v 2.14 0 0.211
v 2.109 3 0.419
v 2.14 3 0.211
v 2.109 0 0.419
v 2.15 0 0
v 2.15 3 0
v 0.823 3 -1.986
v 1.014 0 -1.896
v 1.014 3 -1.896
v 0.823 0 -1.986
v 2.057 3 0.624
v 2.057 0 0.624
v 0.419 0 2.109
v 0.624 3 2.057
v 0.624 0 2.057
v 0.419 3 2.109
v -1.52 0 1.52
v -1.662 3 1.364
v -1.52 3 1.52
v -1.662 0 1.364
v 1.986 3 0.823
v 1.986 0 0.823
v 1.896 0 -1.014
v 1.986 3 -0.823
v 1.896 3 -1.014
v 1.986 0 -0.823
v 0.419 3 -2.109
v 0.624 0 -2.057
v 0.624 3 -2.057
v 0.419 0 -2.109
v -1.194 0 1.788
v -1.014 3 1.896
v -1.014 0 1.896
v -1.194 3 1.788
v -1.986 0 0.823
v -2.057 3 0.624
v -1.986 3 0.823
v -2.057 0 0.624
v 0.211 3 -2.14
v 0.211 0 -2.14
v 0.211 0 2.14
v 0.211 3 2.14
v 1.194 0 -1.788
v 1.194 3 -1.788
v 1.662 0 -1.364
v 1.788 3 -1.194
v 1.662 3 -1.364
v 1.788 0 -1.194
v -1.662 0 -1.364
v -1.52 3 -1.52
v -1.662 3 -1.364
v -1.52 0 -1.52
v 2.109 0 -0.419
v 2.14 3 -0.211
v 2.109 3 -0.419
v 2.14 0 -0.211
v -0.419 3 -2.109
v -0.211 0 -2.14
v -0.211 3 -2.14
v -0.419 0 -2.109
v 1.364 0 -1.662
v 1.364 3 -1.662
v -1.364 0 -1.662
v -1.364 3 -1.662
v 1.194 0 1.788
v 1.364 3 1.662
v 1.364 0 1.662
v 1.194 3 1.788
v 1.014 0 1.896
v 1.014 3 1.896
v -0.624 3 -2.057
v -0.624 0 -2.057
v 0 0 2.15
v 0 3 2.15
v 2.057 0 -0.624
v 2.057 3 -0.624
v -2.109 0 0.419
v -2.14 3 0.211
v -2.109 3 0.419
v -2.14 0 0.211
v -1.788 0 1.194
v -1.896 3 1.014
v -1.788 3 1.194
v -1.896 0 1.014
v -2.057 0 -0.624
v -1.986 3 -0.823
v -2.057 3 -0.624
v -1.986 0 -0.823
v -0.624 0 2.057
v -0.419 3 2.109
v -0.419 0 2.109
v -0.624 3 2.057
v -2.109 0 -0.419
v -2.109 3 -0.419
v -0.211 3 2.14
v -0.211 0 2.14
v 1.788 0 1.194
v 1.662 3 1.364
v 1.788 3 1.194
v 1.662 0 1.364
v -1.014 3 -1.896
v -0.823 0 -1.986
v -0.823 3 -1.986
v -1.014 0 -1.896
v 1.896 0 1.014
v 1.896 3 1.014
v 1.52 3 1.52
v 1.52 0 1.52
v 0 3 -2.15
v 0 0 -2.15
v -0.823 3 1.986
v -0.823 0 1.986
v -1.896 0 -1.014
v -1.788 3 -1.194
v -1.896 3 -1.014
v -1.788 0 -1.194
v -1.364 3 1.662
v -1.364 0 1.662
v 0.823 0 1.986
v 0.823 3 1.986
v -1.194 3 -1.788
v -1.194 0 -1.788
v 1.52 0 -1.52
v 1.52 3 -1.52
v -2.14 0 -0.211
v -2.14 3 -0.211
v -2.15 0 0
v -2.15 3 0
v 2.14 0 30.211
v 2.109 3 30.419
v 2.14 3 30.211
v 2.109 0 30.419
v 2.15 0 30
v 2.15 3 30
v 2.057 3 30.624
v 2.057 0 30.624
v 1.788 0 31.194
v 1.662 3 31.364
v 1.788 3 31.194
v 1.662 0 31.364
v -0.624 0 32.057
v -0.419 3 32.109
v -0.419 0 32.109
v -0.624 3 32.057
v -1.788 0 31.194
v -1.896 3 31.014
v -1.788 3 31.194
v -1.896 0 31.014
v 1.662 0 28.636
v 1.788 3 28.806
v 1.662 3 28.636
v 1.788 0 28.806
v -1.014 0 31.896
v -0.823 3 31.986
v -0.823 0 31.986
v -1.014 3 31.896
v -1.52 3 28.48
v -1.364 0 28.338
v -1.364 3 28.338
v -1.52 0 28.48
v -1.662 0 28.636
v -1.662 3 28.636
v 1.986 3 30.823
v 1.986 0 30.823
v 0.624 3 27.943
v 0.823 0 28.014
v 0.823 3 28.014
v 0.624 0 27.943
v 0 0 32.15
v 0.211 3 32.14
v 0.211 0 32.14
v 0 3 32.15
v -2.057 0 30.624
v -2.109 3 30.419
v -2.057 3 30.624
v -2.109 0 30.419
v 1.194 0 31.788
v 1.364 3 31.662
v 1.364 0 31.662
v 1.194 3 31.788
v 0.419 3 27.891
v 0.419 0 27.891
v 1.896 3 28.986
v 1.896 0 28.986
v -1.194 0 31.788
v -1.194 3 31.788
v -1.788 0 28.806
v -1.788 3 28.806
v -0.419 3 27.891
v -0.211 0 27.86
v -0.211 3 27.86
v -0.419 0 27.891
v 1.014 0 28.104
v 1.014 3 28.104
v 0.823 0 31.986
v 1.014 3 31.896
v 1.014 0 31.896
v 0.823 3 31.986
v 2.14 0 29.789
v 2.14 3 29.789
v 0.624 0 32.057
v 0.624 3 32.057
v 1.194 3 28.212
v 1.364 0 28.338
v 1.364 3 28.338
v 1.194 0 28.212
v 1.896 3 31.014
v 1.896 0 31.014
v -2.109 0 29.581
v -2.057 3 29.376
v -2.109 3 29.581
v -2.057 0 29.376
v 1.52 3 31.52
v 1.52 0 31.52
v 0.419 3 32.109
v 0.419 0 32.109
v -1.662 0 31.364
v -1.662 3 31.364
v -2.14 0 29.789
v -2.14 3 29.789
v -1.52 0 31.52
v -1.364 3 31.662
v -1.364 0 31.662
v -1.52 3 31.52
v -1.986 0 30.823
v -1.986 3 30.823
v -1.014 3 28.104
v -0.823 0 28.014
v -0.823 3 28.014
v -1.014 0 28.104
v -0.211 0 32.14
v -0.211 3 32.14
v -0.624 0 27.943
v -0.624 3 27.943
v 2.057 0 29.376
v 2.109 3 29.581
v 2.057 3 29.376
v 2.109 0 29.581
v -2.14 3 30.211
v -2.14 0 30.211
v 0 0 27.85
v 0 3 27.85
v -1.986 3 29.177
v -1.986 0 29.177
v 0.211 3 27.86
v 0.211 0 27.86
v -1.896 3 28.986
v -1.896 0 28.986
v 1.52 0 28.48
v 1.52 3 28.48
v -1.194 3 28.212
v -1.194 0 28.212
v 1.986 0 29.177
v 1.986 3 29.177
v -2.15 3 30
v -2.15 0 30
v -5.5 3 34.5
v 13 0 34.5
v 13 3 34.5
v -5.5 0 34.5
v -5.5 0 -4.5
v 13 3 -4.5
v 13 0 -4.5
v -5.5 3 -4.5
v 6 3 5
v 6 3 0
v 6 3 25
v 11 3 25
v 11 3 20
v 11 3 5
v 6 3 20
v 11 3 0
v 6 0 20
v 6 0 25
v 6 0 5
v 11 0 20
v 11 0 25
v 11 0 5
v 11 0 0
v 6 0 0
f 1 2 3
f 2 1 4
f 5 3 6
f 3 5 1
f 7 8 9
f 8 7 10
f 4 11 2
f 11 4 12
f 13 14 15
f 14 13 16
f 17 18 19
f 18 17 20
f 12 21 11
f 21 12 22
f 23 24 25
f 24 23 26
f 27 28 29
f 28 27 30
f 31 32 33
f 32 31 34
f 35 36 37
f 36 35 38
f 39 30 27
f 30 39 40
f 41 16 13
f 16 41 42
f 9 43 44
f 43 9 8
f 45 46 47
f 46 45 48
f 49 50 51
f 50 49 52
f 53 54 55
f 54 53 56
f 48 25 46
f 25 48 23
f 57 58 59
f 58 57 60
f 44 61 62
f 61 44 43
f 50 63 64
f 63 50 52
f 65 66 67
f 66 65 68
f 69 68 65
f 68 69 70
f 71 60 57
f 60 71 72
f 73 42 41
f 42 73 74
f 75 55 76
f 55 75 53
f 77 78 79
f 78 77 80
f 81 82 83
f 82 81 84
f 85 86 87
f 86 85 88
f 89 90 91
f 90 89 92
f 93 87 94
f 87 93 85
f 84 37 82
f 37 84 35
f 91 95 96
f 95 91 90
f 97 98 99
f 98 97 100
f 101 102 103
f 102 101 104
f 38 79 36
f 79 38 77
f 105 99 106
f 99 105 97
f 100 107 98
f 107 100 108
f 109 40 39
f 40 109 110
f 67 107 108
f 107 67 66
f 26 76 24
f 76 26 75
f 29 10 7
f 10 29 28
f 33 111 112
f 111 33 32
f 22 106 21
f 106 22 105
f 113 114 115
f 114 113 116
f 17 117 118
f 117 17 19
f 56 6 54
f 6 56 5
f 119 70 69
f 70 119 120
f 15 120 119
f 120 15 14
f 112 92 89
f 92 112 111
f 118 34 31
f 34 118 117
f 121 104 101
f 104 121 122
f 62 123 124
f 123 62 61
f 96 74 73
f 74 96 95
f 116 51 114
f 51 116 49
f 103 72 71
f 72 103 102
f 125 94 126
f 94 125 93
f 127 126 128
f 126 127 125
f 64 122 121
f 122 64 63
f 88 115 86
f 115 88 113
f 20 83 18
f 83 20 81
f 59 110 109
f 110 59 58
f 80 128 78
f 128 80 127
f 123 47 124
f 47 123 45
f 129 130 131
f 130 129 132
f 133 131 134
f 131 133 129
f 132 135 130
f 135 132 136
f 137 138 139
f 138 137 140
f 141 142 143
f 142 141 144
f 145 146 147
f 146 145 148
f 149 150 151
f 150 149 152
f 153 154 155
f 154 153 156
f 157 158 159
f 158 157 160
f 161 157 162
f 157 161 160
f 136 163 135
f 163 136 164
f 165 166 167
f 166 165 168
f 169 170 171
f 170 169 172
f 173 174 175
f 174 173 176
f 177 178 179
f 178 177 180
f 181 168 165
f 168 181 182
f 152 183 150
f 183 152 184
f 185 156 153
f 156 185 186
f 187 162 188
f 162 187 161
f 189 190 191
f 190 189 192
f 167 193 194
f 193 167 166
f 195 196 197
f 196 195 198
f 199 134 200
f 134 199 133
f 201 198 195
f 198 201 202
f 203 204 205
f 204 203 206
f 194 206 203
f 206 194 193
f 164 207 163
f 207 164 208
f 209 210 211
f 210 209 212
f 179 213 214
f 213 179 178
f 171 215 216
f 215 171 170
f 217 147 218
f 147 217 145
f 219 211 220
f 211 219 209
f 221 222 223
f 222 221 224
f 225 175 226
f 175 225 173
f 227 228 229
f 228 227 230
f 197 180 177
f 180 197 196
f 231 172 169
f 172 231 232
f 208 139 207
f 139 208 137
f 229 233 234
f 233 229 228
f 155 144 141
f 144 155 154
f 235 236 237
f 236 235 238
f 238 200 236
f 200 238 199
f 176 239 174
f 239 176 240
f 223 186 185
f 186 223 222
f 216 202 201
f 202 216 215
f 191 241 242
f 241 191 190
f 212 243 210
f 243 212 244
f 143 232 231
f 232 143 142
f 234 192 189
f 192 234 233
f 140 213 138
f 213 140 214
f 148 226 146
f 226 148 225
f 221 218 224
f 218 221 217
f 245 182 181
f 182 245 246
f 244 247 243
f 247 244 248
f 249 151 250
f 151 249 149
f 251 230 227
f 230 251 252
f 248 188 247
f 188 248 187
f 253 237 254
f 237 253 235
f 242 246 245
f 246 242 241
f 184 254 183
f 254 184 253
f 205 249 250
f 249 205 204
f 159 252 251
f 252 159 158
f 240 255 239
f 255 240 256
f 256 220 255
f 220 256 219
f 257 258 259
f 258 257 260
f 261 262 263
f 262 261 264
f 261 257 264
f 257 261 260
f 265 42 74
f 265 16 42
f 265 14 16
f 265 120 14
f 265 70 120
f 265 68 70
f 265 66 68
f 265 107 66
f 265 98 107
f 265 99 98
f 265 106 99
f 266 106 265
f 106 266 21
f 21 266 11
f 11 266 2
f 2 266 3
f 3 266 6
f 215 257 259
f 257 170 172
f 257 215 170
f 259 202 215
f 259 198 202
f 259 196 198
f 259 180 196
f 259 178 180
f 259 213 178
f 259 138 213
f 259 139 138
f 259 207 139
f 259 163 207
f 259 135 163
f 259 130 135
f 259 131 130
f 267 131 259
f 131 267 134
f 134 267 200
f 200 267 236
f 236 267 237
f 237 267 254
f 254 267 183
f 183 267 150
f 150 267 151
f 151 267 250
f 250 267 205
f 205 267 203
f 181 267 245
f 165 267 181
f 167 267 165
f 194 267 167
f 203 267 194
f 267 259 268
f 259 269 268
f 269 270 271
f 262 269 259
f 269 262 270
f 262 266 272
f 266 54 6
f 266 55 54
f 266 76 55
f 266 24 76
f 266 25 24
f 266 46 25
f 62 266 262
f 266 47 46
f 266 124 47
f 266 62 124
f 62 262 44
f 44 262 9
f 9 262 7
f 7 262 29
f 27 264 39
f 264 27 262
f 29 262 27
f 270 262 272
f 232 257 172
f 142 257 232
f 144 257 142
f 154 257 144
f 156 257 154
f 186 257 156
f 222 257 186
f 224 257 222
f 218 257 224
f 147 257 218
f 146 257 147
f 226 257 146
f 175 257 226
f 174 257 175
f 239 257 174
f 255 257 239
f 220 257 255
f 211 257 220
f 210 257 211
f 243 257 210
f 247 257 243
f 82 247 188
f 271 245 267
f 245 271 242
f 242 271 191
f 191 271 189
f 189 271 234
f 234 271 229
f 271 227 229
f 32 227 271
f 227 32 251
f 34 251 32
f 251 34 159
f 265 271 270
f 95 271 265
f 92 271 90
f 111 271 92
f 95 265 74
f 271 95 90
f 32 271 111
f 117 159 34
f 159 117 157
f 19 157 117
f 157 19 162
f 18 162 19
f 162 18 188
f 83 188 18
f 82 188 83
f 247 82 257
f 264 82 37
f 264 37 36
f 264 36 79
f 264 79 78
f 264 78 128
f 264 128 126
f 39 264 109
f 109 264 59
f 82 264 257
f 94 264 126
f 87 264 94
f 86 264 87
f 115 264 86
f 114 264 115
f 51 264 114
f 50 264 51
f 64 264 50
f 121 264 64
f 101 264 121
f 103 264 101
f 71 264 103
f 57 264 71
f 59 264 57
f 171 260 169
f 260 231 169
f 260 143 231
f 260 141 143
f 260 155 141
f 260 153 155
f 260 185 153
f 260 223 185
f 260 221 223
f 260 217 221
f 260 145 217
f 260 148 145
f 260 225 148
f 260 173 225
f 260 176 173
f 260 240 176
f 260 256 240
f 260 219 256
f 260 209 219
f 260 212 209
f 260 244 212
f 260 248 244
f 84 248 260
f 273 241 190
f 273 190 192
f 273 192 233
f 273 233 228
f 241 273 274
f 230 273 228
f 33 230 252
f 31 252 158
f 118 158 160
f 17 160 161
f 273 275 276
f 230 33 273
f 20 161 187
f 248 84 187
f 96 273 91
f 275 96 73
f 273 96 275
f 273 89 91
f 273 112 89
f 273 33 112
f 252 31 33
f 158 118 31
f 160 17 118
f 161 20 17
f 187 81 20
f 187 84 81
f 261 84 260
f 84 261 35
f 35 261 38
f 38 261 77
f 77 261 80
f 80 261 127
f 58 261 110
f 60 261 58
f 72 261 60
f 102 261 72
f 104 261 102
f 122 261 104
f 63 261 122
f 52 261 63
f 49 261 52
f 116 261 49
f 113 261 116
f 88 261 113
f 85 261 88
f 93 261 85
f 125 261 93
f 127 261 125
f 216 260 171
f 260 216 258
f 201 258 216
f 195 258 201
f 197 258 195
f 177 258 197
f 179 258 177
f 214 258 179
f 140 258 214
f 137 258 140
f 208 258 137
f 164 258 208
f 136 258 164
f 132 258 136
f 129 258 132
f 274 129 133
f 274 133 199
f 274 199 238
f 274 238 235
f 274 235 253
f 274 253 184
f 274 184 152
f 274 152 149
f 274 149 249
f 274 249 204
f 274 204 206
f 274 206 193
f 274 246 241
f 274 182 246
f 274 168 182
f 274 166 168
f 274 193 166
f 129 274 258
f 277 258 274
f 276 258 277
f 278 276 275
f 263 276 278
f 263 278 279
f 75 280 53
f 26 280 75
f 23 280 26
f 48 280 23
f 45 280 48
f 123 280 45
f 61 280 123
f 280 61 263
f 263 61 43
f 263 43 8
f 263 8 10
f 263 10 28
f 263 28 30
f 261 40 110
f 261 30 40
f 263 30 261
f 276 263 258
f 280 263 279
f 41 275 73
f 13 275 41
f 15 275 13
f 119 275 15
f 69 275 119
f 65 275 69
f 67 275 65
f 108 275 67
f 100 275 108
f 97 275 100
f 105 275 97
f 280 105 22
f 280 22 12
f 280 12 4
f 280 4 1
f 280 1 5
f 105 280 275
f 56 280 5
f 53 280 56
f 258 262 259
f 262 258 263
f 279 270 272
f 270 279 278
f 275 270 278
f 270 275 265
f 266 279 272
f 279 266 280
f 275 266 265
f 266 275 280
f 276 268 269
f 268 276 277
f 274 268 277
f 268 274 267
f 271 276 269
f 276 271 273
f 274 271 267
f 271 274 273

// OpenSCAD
// file: rockpro.scad
include <../common.scad>

// All coordinates are in [x,y], or [x,y,z] format

pcbDimensions = [79.41, 127.06]; // [x,y]
pcbThickness = 1.22;

// TODO move mount points
mountPoints = [[0,0,0], [0,118,0], [71.0,118, 0], [71.0,0,0]];

module mountPoints_N(cylHeight, cylRad1, cylRad2, cylFn, center) {
  for (i=[0:3]) {
    p = mountPoints[i];
    translate(v=[p[0], p[1], p[2]])
    cylinder(r1=cylRad1, r2=cylRad2, h=cylHeight, $fn=cylFn, center=center);
  }
  
}

module pcb() {
  cube(size=[pcbDimensions[0], pcbDimensions[1], pcbThickness]);
}

// defined on x-z plane, start at top of pcb
module frontFaceIOCutouts_N() {
  translate(v=[9,0,0])
    cube(size=[26.0,inf50,7.5]);

  translate(v=[35,0,0])
    cube(size=[35,inf50,17.9]);
}
module backFaceIOCutouts_N() {
  translate(v=[9,0,0])
    cube(size=[61,inf50,14]);
}


module cutoutProfile_N() {

  color([1,0,1])
  union() {
  mirror(v=[0,1,0])
    translate(v=[0,-1,pcbThickness])
    frontFaceIOCutouts_N();

  translate(v=[0,pcbDimensions[1]-1, pcbThickness])
  backFaceIOCutouts_N();
  }

  color([0.3,0.8,0.1])
  difference() {
    pcb();
    translate(v=[3.75, 3.75])
      mountPoints_N(10,2,2,10,true);
  }
}

//cutoutProfile_N();


//mountPoints_N(10,2,2, true);
// file: ../rack/screws.scad
/* Some common screw dimensions */


inf = 400; // basically infinity

/********************************************************************************/
// M3 dimensions

m3HoleRadiusSlack = 0.15;
m3Diameter = 3.0;
m3Radius = m3Diameter/2.0;

m3RadiusSlacked = m3Radius + m3HoleRadiusSlack;

// legacy TODO: replace
m3ptr = m3RadiusSlacked;

// NUTS!
m3HexNutWidthAcrossFlats = 5.41;
m3HexNutWidthAcrossCorners = FtoG(m3HexNutWidthAcrossFlats);

m3HexNutThickness = 2.18;

module m3HexNutPocketNegative() {
  hexNutPocketNegative(m3RadiusSlacked,
                       m3HexNutWidthAcrossCorners/2 + 0.1,
                       m3HexNutThickness + 0.2);
}


// TODO: remove test

*difference() {
  cube(size=[8,12,5], center=true);

  rotate(a=[0,0,20])
  m3HexNutPocketNegative();
}

*m3HexNutPocketNegative();


/********************************************************************************/
// M4 dimensions

m4HoleRadiusSlack = 0.15;
m4Diameter = 4.0;
m4Radius = m4Diameter/2.0;
m4RadiusSlacked = m4Radius + m4HoleRadiusSlack;

m4HexNutWidthAcrossFlats = 6.89;
m4HexNutWidthAcrossCorners = FtoG(m4HexNutWidthAcrossFlats);

m4HexNutThickness = 3.07;

module m4HexNutPocketNegative() {
  hexNutPocketNegative(m4RadiusSlacked,
                       m4HexNutWidthAcrossCorners/2 + 0.1,
                       m4HexNutThickness + 0.2);
}


// TODO: remove test

*difference() {
  translate(v=[0,1,0])
  cube(size=[10,12,6], center=true);

  rotate(a=[0,0,20])
  m4HexNutPocketNegative();
}

*m4HexNutPocketNegative();

/********************************************************************************/

// Convert a regular hexagon widthAcrossFlats to widthAcrossCorners
function FtoG(widthAcrossFlats) = widthAcrossFlats * (2/sqrt(3));  

// Convert a regular hexagon widthAcrossCorners to widthAcrossFlats
function GtoF(widthAcrossCorners) =  widthAcrossCorners * (sqrt(3)/2);


module hexNutPocketNegative(
  innerRadius,
  widthAcrossCorners,
  thickness)
{

  union() {

    hull() {
      // hexagonal cylinder representing where the nut should fit
      cylinder(r=widthAcrossCorners, h=thickness, center=true, $fn=6);

      // negative volume for sliding in the nut
      translate(v=[inf,0,0])
      cylinder(r=widthAcrossCorners, h=thickness, center=true, $fn=6);
    }

    // negative volume for screw lead
    translate(v=[0,0,-10])
    cylinder(r=innerRadius, h = inf, $fn=32);

    hull() {
     translate(v=[inf,0,0])
       cylinder(r=innerRadius, h = inf, $fn=32);
     cylinder(r=innerRadius, h = inf, $fn=32);
    }
  }
}
// file: ../common.scad
/* Some initial configurations and commonly used variables
   plus functions
*/

$fn=64;


eps=0.01;

inf10 = 10;
inf50 = 50;
inf1000 = 1000;
inf = inf1000;
// file: ../rack-tray/rack-tray.scad
eps=0.01;
vU = 2;
uHeight = 10;

plateScrewDiffV = uHeight*vU;
plateScrewDiffH = 180;

plateScrewToHEdge = 4.5;
plateScrewToVEdge = 5.5;

frontPlateThickness = 3;

frontPlateV = plateScrewDiffV + 2*plateScrewToHEdge;
frontPlateH = plateScrewDiffH + 2*plateScrewToVEdge;

//////////////////////////////////////////////////////

trayOuterHeight = 28;
trayOuterWidth = 168;
trayOuterDepth = 130;

trayBottomThickness = 2;
traySideThickness = 3;
trayFrontThickness = 2;


trayInnerWidth = trayOuterWidth - 2*traySideThickness;
trayInnerDepth = trayOuterDepth - trayFrontThickness;
trayInnerHeight = trayOuterHeight - trayBottomThickness;

module _trayBody() {

    difference() {
        cube(size = [trayOuterWidth, trayOuterDepth, trayOuterHeight]);

        union() {
            translate(v = [traySideThickness, trayFrontThickness, trayBottomThickness])
                cube(size = [trayInnerWidth + eps, trayInnerDepth + eps, trayInnerHeight + eps]);


            translate(v=[0,0, trayOuterHeight])
                rotate(a=[-atan(trayInnerHeight/trayOuterDepth),0,0])
                    cube(size=[trayOuterWidth+eps, 2*trayOuterDepth+eps, trayInnerHeight+eps]);

            translate(v=[5+traySideThickness,0,trayBottomThickness])
            cube(size=[trayInnerWidth-10, trayFrontThickness+eps, trayOuterHeight]);
        }
    }
}

// todo make a nice module for this (triangular prism)
module _sideHole_N() {
    scale(v=[2,0.65,0.65])
        difference () {
            cube(size = [trayOuterWidth, trayOuterDepth, trayOuterHeight]);
            translate(v = [0, 0, trayOuterHeight])
                rotate(a = [- atan(trayInnerHeight / trayOuterDepth), 0, 0])
                    cube(size = [trayOuterWidth + eps, 2 * trayOuterDepth + eps, trayInnerHeight + eps]);
        }
}


module trayBody() {
    union() {
        difference() {
            _trayBody();
            union() {
                // bottom holes
                for (i = [0:7]) {
                    translate(v = [35, i * 15 + 10, - eps])
                        *cube(size = [100, 5, 10]);
                }
                translate(v=[-10,5,5])
                _sideHole_N();
            }
        }

        // lugs for front
        translate(v=[0,-2,0])
            cube(size=[5,2,5]);
        translate(v=[trayOuterWidth-5,-2,0])
            cube(size=[5,2,5]);

        translate(v=[0,-2,20])
            cube(size=[5,2,5]);
        translate(v=[trayOuterWidth-5,-2,20])
            cube(size=[5,2,5]);
    }
}




//trayBody();
// main file
include <../rack-tray/rack-tray.scad>
include <../common.scad>
include <../rack/screws.scad>
include <./rockpro.scad>

vU = 3;
uHeight = 10;

plateScrewDiffV = uHeight*vU;
plateScrewDiffH = 180;

plateScrewToHEdge = 4.5;
plateScrewToVEdge = 5.5;

frontPlateThickness = 3;

frontPlateV = plateScrewDiffV + 2*plateScrewToHEdge;
frontPlateH = plateScrewDiffH + 2*plateScrewToVEdge;


plateScrewToBoxMin = 6;

module _frontPlateBody() {
    translate(v=[-plateScrewToVEdge,0,-plateScrewToHEdge])
        cube(size=[frontPlateH,frontPlateThickness,frontPlateV]);
}

module _plateHole() {
    rotate(a=[90,0,0])
        cylinder(r=m4RadiusSlacked, h=inf, center=true);
}


module frontPlate() {

    difference() {
        _frontPlateBody();

        union() {
            // TODO: introduce helper modules for this pattern
            _plateHole();

            translate(v=[plateScrewDiffH,0,0])
                _plateHole();

            translate(v=[0,0,plateScrewDiffV])
                _plateHole();

            translate(v=[plateScrewDiffH,0,plateScrewDiffV])
                _plateHole();
        }
    }
}

difference() {
    frontPlate();
    union() {
        translate(v = [13, 0, - 10])
            cube(size = [300, 100, 100]);

        translate(v=[6,0,0])
            cube(size=[5,5,5]);

        translate(v=[6,0,20])
            cube(size=[5,5,5]);
    }
}



// todo use library constants
module screwRiser(height) {
    difference() {
        cylinder(d=5, h=height, $fn=64);
        cylinder(d=2.88, h=height, $fn=64);
    }
}

module mountPoints_N(cylHeight, cylRad1, cylRad2, cylFn, center) {
    for (i=[0:3]) {
        p = mountPoints[i];
        translate(v=[p[0], p[1], p[2]])
            cylinder(r1=cylRad1, r2=cylRad2, h=cylHeight, $fn=cylFn, center=center);
    }

}

module rockProScrewMounts() {
    for (i=[0:3]) {
        p = mountPoints[i];
        translate(v=[p[0], p[1], p[2]])
            screwRiser(5);
    }
}


module rockProDualTray() {


    trayBody();
    translate(v=[9,8,trayBottomThickness])
        rockProScrewMounts();

    translate(v=[9 + pcbDimensions[0],8,trayBottomThickness])
        rockProScrewMounts();

}

*difference() {
    rockProDualTray();
    // file specific bottom holes
    union() {
        translate(v = [10, 15, 0])
            minkowski() {
                cube(size = [69, 100, 5]);
                cylinder(r = 1);
            }

        translate(v=[88,15,0])
            minkowski() {
                cube(size = [69, 100, 5]);
                cylinder(r=1);
            }
    }
}
